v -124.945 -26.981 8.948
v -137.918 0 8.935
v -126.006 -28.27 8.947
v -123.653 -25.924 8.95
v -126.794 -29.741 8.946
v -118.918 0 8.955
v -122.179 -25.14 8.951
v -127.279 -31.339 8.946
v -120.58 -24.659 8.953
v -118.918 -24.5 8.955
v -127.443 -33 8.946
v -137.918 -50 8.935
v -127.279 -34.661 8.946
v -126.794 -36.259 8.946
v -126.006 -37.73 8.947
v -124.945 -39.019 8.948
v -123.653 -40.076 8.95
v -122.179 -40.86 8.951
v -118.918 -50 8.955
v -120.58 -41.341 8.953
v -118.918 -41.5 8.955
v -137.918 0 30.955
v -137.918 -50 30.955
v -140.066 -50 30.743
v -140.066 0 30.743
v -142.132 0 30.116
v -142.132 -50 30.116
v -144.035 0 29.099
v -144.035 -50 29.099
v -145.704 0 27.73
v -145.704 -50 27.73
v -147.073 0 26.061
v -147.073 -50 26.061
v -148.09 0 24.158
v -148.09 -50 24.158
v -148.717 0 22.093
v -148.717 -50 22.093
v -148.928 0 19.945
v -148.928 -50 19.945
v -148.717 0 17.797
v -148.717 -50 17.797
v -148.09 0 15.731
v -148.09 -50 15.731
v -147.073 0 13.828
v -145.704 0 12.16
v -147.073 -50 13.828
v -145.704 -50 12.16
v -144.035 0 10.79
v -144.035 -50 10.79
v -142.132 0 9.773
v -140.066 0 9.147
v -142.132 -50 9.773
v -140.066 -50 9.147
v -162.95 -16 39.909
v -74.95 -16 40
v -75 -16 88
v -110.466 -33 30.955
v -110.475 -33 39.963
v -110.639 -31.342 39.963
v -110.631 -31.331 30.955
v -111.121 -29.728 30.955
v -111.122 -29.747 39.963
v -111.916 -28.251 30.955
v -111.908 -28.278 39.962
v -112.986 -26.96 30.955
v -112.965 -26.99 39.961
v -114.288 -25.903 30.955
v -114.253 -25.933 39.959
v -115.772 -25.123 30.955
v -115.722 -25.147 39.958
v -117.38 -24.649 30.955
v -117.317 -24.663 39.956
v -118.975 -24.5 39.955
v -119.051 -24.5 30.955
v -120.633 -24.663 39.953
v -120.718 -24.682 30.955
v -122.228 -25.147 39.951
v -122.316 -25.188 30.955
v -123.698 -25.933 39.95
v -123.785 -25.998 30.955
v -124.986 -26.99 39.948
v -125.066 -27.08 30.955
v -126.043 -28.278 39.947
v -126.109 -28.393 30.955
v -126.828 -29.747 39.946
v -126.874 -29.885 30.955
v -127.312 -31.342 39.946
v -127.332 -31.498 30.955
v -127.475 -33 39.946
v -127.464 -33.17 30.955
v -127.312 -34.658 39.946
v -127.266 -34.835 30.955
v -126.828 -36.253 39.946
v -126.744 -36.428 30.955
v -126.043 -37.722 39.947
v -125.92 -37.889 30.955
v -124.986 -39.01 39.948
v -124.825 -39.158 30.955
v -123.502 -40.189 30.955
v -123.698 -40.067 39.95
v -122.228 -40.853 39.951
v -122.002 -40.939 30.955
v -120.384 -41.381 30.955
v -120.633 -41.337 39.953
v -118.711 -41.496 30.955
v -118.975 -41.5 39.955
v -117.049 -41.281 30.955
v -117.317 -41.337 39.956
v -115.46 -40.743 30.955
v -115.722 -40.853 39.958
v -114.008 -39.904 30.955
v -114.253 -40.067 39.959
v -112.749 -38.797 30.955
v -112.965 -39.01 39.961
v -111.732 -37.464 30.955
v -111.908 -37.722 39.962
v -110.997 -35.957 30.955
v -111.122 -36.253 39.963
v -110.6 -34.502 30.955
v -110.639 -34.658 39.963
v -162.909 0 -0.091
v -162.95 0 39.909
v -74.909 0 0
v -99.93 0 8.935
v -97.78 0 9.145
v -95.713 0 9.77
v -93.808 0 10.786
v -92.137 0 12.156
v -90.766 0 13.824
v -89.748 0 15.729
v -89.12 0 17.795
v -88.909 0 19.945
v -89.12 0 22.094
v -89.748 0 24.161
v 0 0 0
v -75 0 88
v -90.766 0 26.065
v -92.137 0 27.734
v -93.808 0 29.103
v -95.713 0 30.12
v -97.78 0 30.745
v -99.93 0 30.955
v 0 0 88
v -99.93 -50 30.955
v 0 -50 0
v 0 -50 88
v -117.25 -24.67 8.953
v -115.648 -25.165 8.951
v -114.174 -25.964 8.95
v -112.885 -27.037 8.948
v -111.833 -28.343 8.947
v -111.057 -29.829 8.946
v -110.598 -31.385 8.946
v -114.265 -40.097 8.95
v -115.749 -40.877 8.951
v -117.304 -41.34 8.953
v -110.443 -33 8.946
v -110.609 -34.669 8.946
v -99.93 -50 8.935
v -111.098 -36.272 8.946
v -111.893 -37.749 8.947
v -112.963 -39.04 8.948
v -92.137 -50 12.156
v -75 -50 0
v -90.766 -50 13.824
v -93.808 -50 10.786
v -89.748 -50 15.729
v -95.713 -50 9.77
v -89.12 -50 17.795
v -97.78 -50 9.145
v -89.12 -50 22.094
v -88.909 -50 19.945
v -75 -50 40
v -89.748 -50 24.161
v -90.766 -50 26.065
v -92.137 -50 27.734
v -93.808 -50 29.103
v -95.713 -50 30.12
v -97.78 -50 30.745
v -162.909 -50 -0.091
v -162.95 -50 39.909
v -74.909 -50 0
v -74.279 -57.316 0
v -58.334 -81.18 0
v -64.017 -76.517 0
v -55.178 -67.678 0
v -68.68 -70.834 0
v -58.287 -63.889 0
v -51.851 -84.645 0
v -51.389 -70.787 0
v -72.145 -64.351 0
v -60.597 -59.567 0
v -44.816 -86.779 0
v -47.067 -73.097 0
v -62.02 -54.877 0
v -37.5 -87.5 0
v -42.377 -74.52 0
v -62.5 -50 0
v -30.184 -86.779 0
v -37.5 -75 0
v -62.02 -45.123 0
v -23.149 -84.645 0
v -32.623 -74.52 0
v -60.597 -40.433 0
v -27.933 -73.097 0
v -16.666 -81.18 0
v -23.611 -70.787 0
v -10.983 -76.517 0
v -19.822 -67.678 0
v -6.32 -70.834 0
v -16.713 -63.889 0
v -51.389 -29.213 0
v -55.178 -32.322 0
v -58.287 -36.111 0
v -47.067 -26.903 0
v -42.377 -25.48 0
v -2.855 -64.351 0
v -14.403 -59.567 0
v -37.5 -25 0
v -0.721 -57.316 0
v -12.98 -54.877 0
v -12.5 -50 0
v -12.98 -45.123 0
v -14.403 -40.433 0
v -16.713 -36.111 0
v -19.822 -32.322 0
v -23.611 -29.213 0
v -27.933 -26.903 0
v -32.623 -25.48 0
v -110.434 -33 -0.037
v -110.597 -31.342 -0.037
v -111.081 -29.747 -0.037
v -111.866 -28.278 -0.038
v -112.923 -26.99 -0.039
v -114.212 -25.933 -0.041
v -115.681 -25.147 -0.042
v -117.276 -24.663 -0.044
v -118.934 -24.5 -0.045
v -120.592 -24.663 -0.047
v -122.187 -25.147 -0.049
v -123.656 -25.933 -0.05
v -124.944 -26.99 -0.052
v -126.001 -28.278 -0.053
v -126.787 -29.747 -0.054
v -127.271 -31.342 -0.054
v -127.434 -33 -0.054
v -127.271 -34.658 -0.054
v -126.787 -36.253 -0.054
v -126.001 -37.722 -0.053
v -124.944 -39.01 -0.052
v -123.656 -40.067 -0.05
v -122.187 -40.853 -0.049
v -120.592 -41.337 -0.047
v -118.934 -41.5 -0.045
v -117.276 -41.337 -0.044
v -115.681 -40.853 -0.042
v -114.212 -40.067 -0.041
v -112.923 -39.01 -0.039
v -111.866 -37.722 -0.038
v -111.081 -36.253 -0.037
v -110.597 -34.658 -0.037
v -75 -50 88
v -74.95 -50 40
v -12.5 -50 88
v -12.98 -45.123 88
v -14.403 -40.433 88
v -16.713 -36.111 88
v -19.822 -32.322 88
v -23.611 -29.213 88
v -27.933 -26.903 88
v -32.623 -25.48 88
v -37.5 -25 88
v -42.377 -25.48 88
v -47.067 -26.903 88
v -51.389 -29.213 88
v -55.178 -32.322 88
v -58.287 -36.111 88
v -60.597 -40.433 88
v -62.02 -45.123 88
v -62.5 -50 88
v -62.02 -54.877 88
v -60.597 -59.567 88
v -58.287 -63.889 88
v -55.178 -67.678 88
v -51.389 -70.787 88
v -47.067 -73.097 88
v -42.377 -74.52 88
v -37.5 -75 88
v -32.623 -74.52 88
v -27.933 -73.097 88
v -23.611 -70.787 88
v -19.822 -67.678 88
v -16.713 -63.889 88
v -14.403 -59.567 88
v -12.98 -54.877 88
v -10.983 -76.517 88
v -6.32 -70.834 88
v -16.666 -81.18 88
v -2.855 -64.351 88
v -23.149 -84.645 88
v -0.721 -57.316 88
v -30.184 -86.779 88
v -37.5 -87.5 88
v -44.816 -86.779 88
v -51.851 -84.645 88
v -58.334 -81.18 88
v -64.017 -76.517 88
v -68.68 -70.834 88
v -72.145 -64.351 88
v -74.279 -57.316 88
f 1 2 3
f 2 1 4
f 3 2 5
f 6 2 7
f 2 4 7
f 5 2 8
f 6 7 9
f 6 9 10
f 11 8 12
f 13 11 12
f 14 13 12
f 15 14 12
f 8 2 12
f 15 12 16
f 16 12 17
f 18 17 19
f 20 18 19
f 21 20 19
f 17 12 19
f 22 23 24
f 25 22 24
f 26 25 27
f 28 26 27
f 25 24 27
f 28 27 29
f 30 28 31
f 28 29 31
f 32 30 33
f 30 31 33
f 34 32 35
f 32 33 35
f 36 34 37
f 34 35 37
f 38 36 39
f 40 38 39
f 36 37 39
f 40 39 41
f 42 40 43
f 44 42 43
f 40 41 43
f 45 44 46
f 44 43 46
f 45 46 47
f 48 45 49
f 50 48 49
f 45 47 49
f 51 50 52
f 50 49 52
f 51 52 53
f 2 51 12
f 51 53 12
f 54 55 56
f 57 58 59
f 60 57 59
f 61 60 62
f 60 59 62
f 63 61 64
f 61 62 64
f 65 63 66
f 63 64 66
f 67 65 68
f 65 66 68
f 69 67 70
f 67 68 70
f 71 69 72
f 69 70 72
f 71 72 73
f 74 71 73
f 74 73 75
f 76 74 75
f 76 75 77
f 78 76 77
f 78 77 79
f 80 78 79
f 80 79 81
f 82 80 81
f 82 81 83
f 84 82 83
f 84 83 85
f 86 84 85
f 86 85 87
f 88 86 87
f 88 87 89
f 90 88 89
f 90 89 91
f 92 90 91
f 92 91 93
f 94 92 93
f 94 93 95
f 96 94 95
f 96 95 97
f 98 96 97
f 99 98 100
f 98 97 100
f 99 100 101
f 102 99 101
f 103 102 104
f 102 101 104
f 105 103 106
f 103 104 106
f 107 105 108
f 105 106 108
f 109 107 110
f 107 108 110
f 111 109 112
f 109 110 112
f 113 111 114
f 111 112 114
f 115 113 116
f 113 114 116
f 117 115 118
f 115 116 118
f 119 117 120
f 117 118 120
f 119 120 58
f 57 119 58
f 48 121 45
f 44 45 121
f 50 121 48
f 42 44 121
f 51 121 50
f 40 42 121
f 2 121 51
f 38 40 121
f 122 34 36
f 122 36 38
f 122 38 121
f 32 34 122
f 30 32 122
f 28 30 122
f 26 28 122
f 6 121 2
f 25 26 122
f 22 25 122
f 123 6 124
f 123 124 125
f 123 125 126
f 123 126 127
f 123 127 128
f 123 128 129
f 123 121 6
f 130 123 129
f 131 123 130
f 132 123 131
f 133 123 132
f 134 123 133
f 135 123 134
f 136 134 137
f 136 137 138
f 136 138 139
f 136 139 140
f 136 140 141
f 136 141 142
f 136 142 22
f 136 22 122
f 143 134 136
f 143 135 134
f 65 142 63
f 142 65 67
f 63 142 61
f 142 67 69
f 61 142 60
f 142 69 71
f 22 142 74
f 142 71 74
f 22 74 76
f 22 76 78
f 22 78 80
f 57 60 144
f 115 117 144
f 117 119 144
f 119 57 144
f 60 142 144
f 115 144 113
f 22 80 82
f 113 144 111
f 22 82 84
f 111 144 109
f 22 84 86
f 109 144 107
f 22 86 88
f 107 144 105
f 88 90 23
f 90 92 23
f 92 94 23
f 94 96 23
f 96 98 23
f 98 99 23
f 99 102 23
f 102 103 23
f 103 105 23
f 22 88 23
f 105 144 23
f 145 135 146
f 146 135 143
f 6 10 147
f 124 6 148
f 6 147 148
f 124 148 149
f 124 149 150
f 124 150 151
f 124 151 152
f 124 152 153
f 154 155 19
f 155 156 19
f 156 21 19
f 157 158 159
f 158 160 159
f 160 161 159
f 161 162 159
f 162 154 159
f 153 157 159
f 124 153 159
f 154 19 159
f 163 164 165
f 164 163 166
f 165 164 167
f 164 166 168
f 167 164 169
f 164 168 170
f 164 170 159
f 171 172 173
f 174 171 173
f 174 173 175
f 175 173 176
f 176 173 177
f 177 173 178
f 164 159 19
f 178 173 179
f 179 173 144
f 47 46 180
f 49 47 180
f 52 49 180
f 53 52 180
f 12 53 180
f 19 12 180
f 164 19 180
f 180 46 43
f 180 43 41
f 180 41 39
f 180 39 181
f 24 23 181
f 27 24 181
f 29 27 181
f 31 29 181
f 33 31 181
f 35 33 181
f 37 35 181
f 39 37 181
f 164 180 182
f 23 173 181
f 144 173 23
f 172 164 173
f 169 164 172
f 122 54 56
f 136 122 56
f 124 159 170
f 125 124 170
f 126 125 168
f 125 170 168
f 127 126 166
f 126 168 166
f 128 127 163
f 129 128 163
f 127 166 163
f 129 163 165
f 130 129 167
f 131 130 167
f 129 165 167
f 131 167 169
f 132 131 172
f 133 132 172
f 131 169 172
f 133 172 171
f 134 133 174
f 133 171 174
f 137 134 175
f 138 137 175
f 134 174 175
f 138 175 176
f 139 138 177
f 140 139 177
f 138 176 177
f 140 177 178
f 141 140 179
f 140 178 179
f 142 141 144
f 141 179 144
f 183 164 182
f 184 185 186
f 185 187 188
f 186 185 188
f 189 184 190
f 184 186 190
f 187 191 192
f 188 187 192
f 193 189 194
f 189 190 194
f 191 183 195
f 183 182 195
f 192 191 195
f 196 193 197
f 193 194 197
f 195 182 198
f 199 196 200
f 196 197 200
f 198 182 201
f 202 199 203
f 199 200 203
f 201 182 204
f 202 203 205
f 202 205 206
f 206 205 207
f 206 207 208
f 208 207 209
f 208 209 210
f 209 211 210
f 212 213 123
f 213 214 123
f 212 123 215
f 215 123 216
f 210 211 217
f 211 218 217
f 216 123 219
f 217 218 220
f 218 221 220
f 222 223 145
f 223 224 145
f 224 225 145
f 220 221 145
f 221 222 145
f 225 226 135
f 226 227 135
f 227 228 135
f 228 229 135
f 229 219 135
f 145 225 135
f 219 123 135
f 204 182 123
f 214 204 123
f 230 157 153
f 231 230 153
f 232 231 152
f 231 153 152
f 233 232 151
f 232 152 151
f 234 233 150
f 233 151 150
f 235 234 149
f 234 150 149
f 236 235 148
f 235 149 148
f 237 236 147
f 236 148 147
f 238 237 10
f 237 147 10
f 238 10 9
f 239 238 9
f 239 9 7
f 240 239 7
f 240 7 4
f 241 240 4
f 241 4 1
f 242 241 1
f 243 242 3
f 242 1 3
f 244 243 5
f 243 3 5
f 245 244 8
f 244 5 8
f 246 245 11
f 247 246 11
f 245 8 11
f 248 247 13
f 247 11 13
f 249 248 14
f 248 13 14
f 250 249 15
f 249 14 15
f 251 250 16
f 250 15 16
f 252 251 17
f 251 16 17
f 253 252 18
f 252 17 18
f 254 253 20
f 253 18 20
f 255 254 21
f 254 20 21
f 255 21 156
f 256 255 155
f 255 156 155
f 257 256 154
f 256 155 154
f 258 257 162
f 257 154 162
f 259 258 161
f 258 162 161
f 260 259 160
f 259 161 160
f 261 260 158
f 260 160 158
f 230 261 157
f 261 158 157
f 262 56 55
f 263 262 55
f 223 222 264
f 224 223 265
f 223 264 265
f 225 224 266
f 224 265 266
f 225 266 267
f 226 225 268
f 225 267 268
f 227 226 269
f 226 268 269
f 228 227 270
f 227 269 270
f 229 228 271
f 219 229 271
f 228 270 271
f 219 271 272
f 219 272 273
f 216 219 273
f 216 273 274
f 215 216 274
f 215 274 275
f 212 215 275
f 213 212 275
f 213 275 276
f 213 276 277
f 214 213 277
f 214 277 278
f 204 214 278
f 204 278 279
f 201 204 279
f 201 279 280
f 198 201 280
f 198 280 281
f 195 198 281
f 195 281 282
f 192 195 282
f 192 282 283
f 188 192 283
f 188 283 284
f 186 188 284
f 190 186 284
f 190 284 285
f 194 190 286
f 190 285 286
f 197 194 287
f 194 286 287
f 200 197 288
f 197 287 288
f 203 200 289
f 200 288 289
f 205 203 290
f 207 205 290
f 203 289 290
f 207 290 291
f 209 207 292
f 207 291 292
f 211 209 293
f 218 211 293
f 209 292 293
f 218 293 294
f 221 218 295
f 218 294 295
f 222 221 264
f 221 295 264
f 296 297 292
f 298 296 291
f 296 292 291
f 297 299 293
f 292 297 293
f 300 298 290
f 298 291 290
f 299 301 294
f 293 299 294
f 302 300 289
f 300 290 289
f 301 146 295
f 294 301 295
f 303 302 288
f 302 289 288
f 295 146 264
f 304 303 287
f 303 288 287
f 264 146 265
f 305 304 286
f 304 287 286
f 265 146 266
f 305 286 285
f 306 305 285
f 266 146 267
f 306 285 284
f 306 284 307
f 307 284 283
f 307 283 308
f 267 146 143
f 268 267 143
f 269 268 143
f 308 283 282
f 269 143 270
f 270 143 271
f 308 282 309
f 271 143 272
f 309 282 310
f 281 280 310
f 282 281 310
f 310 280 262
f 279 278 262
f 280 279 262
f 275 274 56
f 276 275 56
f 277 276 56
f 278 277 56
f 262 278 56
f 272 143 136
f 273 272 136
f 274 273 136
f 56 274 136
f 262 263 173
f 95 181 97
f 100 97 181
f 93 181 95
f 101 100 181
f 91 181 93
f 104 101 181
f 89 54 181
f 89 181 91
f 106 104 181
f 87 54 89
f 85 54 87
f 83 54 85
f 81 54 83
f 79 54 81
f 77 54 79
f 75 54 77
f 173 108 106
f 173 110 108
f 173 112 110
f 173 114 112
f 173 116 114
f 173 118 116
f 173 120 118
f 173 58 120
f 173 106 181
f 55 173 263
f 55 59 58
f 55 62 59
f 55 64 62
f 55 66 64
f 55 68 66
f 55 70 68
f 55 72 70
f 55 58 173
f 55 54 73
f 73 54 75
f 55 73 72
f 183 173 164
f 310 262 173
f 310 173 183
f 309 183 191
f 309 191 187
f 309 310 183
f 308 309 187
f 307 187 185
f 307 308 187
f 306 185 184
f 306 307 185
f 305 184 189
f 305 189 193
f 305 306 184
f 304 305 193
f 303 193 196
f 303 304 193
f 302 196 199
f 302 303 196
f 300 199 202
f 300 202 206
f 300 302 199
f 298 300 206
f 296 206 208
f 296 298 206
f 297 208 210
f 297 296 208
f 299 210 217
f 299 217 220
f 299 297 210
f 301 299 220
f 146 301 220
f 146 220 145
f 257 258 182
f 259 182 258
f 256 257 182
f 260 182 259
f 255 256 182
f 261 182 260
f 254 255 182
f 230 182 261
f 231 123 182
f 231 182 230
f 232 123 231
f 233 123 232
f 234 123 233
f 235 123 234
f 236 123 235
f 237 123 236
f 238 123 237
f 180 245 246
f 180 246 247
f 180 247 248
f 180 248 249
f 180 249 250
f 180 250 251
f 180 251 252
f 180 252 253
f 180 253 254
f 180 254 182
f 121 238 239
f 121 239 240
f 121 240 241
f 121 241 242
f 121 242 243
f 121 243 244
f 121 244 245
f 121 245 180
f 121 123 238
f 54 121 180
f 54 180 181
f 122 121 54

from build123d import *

# Parameters (mm, degrees)
F1_DEPTH  = 50
F3_DEPTH  = 88
F4_R      = 25
F5_DEPTH  = 115
F7_DEPTH  = 50
F8_W      = 16
F8_H      = 48.0000468988
F9_DEPTH  = 88
F11_DEPTH = 27.7
F12_R     = 8.5
F13_DEPTH = 57.3
F15_DEPTH = 109.8


with BuildPart() as f1:
    # F0 (on Front) → F1 (new body)
    with BuildSketch(Plane.XZ):
        Polygon((-74.9091474319, 0), (0, 0), (0, 88), (-75, 88), align=None)
    extrude(amount=F1_DEPTH)

    # F2 (on face) → F3 (join)
    with BuildSketch(Plane.XY.offset(88)):
        with BuildLine():
            Line((0, -50), (-75, -50))
            ThreePointArc((-75, -50), (-37.5, -87.5), (0, -50))
        make_face()
    extrude(amount=-F3_DEPTH)

    # F4 (on face) → F5 (cut)
    with BuildSketch(Plane.XY.offset(88)):
        with Locations((-37.5, -50)):
            Circle(F4_R)
    extrude(amount=-F5_DEPTH, mode=Mode.SUBTRACT)

    # F6 (on face) → F7 (join)
    with BuildSketch(Plane(origin=(0, 0, 0), x_dir=(-1, 0, 0), z_dir=(0, 1, 0))):
        Polygon((74.9504440318, 39.9999786824), (74.9091474319, 0), (162.9091005331, -0.0908525197), (162.950397133, 39.9091261627), align=None)
    extrude(amount=-F7_DEPTH)

    # F8 (on face) → F9 (join)
    with BuildSketch(Plane(origin=(-74.9090675877, 0, -0.077337286), x_dir=(0, -1, 0), z_dir=(-0.9999994671, 0, -0.001032415))):
        with Locations((8, 64.0773607766)):
            Rectangle(F8_W, F8_H)
    extrude(amount=F9_DEPTH)

    # F10 (on face) → F11 (cut)
    with BuildSketch(Plane.XZ.offset(16)):
        Polygon((-162.9999531012, 87.9091474803), (-162.950397133, 39.9091261627), (-75, 88), align=None)
    extrude(amount=-F11_DEPTH, mode=Mode.SUBTRACT)

    # F12 (on face) → F13 (cut)
    with BuildSketch(Plane(origin=(-0.0413764441, 0, 40.0773159683), x_dir=(0.9999994671, 0, 0.001032415), z_dir=(-0.001032415, 0, 0.9999994671))):
        with Locations((-118.9338855071, -33)):
            Circle(F12_R)
    extrude(amount=-F13_DEPTH, mode=Mode.SUBTRACT)

    # F14 (on face) → F15 (cut)
    with BuildSketch(Plane.XZ.offset(50)):
        with BuildLine():
            Line((-137.9184055916, 8.9349530588), (-118.9184157175, 8.9545689437))
            Line((-118.9184157175, 8.9545689437), (-99.9297824083, 8.9349530588))
            ThreePointArc((-99.9297824083, 8.9349530588), (-88.9086009647, 19.9447551389), (-99.9297824083, 30.954557219))
            Line((-99.9297824083, 30.954557219), (-118.9411288474, 30.954557219))
            Line((-118.9411288474, 30.954557219), (-137.9184055916, 30.954557219))
            ThreePointArc((-137.9184055916, 30.954557219), (-148.9282076717, 19.9447551389), (-137.9184055916, 8.9349530588))
        make_face()
    extrude(amount=-F15_DEPTH, mode=Mode.SUBTRACT)


solid = f1.part
